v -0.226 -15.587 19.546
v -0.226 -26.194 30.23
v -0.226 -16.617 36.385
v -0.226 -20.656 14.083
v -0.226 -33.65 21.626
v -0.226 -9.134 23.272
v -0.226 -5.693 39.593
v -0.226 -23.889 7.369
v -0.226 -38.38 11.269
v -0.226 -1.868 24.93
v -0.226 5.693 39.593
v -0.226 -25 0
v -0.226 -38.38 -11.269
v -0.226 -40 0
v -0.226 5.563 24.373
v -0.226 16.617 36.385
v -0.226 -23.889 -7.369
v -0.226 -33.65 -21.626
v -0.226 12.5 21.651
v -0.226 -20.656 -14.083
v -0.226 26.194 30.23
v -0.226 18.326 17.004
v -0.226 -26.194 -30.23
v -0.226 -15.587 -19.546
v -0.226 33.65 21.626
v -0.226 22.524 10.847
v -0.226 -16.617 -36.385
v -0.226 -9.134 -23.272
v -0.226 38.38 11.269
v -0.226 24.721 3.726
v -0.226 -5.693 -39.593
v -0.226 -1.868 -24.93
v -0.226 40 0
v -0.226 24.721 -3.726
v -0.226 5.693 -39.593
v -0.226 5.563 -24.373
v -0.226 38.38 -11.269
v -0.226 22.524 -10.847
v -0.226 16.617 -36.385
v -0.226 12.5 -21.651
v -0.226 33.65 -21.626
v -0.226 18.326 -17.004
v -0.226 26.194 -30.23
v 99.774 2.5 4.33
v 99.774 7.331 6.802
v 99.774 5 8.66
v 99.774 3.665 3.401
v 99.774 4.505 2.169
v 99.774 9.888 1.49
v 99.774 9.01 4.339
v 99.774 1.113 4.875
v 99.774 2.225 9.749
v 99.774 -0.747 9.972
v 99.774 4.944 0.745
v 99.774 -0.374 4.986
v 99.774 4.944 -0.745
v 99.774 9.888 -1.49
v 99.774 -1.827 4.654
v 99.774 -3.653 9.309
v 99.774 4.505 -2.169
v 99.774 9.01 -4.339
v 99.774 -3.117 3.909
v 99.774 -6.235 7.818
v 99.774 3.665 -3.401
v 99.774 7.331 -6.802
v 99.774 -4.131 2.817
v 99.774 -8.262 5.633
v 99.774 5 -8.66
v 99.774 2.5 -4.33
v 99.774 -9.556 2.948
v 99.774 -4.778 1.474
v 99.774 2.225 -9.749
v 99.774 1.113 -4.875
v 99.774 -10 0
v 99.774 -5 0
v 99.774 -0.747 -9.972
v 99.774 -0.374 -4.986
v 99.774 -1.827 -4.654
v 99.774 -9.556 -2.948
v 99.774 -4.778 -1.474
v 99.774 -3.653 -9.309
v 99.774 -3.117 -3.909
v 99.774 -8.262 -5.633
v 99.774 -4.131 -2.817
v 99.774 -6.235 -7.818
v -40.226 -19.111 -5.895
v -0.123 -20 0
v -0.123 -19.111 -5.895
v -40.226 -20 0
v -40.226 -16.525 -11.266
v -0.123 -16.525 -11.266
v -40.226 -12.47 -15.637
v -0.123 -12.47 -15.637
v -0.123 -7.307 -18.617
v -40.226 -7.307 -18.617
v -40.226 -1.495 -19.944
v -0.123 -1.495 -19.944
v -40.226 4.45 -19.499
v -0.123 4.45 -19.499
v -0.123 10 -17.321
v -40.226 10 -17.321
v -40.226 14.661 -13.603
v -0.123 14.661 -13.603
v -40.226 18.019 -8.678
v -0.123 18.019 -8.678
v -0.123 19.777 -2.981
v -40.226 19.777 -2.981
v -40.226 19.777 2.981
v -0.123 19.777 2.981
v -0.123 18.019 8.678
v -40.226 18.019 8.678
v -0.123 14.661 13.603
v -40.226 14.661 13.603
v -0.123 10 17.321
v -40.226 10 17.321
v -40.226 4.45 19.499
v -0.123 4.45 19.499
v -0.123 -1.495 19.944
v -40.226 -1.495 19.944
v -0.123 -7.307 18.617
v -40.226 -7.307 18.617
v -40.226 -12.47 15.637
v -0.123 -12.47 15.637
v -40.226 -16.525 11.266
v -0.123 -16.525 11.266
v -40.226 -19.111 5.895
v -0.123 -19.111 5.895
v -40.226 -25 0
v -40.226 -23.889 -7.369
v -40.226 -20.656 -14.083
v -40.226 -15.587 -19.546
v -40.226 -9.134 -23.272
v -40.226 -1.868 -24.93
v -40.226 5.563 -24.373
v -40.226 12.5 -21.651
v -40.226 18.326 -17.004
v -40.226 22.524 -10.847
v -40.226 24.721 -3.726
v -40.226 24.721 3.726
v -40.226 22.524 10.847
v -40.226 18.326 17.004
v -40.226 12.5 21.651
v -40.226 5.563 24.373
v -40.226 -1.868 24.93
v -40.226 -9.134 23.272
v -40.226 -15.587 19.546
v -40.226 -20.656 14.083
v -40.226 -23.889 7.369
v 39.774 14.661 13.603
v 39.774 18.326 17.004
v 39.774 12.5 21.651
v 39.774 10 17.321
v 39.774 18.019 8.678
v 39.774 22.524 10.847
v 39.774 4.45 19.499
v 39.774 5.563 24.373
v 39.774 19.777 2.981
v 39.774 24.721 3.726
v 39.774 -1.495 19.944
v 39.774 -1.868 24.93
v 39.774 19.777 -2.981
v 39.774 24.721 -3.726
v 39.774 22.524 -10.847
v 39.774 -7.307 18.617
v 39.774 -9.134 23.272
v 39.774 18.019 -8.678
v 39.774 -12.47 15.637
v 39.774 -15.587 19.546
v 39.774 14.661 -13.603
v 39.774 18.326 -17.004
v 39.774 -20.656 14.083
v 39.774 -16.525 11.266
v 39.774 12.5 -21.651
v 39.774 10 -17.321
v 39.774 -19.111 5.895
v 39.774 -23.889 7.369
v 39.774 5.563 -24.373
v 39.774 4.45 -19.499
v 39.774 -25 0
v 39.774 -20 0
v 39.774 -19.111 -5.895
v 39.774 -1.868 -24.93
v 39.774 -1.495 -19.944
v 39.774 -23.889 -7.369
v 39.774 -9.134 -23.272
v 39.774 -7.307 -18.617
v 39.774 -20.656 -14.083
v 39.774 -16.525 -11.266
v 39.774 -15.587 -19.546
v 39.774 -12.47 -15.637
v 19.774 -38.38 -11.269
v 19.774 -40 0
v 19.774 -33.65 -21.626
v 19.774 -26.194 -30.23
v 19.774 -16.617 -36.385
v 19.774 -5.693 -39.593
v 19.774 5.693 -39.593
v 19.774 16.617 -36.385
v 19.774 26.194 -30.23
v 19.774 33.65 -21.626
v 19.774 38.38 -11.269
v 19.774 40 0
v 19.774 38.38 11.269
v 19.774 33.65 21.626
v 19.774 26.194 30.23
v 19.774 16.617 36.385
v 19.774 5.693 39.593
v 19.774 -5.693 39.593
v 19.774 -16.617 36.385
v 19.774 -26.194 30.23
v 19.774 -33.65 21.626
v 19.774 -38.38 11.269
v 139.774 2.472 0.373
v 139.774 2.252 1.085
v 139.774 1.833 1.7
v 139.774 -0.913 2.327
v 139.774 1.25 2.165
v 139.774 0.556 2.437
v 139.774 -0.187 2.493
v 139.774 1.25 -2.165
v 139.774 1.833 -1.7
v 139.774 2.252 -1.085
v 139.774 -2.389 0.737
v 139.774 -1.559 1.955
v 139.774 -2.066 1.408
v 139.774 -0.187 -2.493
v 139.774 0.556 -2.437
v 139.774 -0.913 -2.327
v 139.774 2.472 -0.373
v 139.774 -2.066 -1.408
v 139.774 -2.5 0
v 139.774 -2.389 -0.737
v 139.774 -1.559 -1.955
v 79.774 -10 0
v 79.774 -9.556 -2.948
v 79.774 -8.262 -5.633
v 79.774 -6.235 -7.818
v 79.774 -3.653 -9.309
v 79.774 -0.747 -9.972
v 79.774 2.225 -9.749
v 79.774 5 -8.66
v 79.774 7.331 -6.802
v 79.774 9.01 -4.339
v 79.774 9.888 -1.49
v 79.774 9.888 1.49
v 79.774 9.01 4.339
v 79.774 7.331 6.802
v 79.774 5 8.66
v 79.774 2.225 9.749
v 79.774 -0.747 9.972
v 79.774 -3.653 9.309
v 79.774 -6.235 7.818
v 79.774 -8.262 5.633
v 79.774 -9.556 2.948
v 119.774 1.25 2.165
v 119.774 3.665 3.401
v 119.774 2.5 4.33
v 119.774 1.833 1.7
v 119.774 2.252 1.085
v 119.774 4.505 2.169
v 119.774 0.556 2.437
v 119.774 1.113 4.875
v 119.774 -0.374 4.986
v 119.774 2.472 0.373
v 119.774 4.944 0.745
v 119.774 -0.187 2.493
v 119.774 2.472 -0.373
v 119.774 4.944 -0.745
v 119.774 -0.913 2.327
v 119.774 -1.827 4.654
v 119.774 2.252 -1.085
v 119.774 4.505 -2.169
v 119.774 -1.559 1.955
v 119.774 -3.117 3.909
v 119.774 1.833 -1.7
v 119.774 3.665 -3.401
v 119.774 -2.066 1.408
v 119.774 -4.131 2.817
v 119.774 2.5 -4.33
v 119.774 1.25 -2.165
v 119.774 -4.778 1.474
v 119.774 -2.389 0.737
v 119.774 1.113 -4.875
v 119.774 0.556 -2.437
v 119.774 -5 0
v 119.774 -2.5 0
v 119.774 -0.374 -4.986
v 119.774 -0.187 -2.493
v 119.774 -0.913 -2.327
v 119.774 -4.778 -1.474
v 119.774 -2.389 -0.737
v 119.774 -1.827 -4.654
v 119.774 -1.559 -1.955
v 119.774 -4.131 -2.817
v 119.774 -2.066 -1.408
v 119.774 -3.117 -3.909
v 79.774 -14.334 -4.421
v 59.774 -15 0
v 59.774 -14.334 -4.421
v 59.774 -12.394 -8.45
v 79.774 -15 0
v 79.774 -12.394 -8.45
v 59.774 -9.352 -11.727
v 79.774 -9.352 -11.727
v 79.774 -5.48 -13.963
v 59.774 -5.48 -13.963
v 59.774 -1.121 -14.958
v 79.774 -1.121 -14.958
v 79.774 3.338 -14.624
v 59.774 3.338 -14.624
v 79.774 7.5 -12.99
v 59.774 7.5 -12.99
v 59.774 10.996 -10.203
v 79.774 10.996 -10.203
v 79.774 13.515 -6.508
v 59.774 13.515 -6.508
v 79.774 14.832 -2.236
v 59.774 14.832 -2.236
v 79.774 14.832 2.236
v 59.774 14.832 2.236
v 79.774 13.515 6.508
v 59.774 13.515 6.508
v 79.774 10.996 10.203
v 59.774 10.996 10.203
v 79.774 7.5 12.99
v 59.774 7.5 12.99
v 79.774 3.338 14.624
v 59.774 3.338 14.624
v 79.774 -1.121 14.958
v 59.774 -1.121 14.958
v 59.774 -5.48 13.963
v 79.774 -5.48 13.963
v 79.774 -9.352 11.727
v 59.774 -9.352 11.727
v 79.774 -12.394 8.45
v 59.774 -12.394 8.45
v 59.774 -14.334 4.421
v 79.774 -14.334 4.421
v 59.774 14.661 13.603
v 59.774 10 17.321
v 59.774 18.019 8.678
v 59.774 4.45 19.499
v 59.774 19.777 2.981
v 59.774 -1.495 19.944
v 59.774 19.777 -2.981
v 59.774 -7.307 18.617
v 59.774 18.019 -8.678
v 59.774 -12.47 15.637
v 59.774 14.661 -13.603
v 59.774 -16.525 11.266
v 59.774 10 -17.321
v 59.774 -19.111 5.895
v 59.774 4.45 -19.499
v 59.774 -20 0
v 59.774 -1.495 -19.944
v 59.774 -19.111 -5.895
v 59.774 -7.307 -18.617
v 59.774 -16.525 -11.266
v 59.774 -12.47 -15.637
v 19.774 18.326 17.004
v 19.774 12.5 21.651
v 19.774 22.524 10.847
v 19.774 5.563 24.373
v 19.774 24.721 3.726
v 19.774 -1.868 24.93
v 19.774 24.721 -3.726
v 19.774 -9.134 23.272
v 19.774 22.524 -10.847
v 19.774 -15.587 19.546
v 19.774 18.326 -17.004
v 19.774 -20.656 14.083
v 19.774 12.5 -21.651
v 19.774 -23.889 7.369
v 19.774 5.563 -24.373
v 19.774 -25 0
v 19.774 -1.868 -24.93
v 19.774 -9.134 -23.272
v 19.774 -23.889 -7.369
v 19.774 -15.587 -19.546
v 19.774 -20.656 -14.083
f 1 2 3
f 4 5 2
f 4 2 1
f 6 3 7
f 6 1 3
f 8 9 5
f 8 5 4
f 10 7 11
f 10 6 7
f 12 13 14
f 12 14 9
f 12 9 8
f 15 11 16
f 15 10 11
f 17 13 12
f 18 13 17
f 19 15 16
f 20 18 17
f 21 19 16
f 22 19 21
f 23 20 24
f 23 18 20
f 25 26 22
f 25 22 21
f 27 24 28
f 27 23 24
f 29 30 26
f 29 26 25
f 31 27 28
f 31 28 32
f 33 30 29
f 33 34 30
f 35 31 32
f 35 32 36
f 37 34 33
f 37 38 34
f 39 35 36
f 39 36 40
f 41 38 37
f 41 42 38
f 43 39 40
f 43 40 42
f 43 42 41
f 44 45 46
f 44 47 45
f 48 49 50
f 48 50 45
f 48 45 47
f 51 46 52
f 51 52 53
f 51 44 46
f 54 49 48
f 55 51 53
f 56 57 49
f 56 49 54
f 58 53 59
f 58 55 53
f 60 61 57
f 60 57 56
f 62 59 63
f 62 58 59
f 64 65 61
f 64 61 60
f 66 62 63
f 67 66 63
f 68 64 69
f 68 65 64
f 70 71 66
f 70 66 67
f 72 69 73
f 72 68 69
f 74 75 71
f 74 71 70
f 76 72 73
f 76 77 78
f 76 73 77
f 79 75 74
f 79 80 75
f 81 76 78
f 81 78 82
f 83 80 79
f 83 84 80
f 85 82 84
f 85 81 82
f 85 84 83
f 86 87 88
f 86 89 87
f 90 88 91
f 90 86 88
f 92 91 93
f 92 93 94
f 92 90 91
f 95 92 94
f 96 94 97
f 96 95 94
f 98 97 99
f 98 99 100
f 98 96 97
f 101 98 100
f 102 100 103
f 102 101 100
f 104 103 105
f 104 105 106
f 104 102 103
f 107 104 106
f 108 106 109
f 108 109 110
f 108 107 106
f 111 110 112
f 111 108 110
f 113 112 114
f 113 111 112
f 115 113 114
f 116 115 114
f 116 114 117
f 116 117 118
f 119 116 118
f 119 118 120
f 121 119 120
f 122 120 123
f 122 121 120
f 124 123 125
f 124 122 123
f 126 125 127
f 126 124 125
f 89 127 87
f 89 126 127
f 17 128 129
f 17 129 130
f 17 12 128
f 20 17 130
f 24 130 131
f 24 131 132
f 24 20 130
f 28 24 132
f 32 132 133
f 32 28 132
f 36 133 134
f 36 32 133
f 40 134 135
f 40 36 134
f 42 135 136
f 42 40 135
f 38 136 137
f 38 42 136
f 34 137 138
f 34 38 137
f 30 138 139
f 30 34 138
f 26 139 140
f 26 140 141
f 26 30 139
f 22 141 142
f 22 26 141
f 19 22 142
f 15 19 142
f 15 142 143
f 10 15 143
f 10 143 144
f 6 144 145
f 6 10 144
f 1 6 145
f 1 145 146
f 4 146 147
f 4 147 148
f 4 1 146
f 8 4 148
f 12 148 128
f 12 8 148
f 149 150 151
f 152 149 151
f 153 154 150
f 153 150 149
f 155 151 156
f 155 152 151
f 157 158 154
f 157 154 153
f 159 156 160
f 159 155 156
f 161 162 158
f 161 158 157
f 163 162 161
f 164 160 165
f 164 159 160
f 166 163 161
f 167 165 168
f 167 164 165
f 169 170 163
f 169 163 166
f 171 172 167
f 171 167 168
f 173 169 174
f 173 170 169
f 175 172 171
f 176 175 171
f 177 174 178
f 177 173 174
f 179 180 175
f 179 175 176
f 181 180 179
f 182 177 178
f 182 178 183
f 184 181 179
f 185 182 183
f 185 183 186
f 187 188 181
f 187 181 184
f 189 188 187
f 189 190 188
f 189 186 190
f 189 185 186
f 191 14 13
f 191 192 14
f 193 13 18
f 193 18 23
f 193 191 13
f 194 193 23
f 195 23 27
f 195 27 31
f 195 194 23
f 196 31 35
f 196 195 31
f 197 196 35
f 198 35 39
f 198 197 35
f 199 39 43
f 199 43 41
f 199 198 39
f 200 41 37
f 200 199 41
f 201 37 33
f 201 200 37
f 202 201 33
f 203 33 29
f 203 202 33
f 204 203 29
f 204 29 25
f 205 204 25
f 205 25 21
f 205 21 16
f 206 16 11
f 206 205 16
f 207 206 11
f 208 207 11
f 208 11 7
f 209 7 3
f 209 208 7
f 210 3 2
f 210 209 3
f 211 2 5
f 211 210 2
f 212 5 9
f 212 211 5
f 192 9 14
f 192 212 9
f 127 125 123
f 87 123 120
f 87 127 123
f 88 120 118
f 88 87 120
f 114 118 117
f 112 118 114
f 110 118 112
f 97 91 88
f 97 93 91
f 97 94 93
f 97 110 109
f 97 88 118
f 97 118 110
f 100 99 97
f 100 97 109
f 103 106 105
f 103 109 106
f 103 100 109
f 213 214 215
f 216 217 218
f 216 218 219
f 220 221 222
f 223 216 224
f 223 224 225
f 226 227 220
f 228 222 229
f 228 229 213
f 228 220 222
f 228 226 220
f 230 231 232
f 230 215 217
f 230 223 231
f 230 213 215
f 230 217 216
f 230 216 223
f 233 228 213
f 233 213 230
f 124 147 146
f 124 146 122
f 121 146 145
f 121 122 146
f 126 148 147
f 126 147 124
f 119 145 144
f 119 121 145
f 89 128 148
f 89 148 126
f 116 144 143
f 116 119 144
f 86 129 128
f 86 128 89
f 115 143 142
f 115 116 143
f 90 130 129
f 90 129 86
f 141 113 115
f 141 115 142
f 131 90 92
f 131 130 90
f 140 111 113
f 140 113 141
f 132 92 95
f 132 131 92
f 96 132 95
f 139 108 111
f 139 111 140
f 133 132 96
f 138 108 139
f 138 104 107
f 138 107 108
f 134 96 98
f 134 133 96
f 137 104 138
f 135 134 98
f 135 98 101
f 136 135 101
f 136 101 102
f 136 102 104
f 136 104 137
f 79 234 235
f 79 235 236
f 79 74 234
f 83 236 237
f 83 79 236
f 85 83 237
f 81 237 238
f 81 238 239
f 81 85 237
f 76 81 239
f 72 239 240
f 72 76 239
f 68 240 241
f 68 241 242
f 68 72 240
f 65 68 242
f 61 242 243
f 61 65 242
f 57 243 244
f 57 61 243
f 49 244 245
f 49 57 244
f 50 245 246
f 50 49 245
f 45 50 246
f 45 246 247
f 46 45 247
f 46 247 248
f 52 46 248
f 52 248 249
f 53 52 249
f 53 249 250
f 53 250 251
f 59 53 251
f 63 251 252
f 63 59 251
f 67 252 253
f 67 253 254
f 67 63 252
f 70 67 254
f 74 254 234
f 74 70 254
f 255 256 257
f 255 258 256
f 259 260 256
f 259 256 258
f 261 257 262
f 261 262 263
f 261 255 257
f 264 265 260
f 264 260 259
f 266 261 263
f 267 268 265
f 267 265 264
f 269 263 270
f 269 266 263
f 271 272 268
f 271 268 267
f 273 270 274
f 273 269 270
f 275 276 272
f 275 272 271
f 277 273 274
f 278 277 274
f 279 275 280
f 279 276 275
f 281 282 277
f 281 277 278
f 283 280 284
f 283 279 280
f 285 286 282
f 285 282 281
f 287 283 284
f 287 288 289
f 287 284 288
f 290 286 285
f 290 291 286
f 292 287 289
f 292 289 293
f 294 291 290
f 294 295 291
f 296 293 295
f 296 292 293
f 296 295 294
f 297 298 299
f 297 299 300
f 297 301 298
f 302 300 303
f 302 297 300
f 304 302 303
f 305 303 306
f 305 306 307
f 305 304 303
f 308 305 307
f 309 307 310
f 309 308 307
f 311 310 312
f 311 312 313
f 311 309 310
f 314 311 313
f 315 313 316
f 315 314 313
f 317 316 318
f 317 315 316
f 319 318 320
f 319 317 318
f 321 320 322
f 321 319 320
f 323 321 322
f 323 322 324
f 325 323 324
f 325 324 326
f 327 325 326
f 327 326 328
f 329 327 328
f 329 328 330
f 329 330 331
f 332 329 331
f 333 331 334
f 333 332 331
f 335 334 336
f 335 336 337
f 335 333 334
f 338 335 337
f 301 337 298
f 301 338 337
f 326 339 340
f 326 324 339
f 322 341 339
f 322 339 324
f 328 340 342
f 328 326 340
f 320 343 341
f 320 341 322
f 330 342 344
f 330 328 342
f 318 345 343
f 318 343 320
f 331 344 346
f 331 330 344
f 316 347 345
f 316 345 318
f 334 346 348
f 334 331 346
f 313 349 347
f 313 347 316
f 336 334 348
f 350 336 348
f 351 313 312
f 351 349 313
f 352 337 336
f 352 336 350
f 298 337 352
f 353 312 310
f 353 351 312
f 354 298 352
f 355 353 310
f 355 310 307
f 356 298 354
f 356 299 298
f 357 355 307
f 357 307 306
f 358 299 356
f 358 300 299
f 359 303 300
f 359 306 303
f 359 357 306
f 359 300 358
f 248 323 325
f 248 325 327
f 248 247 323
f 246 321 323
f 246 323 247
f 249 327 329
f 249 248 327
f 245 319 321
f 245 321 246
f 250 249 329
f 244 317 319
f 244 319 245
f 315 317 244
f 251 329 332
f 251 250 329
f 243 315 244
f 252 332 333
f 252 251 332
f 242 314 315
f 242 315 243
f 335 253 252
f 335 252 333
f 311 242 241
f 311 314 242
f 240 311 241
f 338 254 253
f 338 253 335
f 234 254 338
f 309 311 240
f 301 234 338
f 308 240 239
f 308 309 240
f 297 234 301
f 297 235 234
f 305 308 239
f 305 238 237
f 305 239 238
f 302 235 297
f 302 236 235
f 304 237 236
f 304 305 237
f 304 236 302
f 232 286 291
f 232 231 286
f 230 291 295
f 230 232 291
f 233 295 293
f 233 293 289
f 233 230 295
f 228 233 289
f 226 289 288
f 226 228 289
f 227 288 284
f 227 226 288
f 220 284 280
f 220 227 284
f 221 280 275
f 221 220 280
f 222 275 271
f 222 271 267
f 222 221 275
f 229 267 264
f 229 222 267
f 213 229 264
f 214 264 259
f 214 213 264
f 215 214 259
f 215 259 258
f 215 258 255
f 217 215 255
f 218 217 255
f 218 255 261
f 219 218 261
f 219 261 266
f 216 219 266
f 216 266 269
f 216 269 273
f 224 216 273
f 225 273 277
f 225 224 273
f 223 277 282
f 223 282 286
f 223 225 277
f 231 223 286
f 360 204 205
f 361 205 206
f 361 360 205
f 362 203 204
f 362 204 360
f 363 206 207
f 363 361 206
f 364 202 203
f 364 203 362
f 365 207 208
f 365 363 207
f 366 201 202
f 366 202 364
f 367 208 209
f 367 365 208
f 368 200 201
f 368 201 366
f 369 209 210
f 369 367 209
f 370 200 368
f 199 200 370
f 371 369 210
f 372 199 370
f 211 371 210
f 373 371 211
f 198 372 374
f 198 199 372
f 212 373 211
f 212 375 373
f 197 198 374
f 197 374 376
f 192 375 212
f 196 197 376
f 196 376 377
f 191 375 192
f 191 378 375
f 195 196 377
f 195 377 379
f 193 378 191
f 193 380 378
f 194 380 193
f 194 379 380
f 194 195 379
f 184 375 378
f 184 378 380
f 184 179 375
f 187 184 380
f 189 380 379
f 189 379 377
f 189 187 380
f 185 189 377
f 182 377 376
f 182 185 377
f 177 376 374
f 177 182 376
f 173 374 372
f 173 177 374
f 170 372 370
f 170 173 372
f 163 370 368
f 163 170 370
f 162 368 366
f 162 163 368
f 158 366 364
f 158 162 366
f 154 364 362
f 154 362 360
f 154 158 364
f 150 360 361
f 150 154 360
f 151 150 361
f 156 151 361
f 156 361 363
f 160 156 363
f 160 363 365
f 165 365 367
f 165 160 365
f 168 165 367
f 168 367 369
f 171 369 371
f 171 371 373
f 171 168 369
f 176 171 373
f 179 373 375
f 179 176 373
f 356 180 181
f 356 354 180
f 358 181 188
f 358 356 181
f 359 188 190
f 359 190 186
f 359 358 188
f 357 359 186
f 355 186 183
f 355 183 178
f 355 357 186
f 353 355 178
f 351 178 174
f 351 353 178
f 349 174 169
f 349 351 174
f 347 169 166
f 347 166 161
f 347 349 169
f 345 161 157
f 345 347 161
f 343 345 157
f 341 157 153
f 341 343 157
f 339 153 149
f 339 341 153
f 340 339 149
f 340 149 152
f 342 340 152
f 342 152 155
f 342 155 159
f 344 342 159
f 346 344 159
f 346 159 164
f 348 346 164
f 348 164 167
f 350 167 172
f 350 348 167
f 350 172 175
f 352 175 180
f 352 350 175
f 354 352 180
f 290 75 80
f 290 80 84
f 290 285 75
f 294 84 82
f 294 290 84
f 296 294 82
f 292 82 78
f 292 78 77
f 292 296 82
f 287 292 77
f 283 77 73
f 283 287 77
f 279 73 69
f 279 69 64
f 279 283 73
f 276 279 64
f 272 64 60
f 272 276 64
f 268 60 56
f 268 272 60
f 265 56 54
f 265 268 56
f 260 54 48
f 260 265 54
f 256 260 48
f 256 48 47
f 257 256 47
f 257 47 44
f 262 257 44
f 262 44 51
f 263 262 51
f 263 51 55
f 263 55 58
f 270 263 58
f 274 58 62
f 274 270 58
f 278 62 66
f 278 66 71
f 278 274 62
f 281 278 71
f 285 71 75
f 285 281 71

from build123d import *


with BuildPart() as part:
    # Sketch1 → Revolve2 (revolve)
    with BuildSketch(Plane.XY, mode=Mode.PRIVATE) as revolve2_sk:
        Polygon((-40.225741407, 20), (-40.225741407, 25), (-0.225741407, 25), (-0.225741407, 40), (19.774258593, 40), (19.774258593, 25), (39.774258593, 25), (39.774258593, 20), (59.774258593, 20), (59.774258593, 15), (79.774258593, 15), (79.774258593, 10), (99.774258593, 10), (99.774258593, 5), (119.774258593, 5), (119.774258593, 2.5), (139.774258593, 2.5), (139.774258593, 0), (-0.122966015, 0), (-0.122966015, 20), align=None)
    revolve(revolve2_sk.sketch.rotate(Axis((-74.790093539, 0, 0), (1, 0, 0)), 180), axis=Axis((-74.790093539, 0, 0), (1, 0, 0)))  # turned: the seam where the file's is


solid = part.part
